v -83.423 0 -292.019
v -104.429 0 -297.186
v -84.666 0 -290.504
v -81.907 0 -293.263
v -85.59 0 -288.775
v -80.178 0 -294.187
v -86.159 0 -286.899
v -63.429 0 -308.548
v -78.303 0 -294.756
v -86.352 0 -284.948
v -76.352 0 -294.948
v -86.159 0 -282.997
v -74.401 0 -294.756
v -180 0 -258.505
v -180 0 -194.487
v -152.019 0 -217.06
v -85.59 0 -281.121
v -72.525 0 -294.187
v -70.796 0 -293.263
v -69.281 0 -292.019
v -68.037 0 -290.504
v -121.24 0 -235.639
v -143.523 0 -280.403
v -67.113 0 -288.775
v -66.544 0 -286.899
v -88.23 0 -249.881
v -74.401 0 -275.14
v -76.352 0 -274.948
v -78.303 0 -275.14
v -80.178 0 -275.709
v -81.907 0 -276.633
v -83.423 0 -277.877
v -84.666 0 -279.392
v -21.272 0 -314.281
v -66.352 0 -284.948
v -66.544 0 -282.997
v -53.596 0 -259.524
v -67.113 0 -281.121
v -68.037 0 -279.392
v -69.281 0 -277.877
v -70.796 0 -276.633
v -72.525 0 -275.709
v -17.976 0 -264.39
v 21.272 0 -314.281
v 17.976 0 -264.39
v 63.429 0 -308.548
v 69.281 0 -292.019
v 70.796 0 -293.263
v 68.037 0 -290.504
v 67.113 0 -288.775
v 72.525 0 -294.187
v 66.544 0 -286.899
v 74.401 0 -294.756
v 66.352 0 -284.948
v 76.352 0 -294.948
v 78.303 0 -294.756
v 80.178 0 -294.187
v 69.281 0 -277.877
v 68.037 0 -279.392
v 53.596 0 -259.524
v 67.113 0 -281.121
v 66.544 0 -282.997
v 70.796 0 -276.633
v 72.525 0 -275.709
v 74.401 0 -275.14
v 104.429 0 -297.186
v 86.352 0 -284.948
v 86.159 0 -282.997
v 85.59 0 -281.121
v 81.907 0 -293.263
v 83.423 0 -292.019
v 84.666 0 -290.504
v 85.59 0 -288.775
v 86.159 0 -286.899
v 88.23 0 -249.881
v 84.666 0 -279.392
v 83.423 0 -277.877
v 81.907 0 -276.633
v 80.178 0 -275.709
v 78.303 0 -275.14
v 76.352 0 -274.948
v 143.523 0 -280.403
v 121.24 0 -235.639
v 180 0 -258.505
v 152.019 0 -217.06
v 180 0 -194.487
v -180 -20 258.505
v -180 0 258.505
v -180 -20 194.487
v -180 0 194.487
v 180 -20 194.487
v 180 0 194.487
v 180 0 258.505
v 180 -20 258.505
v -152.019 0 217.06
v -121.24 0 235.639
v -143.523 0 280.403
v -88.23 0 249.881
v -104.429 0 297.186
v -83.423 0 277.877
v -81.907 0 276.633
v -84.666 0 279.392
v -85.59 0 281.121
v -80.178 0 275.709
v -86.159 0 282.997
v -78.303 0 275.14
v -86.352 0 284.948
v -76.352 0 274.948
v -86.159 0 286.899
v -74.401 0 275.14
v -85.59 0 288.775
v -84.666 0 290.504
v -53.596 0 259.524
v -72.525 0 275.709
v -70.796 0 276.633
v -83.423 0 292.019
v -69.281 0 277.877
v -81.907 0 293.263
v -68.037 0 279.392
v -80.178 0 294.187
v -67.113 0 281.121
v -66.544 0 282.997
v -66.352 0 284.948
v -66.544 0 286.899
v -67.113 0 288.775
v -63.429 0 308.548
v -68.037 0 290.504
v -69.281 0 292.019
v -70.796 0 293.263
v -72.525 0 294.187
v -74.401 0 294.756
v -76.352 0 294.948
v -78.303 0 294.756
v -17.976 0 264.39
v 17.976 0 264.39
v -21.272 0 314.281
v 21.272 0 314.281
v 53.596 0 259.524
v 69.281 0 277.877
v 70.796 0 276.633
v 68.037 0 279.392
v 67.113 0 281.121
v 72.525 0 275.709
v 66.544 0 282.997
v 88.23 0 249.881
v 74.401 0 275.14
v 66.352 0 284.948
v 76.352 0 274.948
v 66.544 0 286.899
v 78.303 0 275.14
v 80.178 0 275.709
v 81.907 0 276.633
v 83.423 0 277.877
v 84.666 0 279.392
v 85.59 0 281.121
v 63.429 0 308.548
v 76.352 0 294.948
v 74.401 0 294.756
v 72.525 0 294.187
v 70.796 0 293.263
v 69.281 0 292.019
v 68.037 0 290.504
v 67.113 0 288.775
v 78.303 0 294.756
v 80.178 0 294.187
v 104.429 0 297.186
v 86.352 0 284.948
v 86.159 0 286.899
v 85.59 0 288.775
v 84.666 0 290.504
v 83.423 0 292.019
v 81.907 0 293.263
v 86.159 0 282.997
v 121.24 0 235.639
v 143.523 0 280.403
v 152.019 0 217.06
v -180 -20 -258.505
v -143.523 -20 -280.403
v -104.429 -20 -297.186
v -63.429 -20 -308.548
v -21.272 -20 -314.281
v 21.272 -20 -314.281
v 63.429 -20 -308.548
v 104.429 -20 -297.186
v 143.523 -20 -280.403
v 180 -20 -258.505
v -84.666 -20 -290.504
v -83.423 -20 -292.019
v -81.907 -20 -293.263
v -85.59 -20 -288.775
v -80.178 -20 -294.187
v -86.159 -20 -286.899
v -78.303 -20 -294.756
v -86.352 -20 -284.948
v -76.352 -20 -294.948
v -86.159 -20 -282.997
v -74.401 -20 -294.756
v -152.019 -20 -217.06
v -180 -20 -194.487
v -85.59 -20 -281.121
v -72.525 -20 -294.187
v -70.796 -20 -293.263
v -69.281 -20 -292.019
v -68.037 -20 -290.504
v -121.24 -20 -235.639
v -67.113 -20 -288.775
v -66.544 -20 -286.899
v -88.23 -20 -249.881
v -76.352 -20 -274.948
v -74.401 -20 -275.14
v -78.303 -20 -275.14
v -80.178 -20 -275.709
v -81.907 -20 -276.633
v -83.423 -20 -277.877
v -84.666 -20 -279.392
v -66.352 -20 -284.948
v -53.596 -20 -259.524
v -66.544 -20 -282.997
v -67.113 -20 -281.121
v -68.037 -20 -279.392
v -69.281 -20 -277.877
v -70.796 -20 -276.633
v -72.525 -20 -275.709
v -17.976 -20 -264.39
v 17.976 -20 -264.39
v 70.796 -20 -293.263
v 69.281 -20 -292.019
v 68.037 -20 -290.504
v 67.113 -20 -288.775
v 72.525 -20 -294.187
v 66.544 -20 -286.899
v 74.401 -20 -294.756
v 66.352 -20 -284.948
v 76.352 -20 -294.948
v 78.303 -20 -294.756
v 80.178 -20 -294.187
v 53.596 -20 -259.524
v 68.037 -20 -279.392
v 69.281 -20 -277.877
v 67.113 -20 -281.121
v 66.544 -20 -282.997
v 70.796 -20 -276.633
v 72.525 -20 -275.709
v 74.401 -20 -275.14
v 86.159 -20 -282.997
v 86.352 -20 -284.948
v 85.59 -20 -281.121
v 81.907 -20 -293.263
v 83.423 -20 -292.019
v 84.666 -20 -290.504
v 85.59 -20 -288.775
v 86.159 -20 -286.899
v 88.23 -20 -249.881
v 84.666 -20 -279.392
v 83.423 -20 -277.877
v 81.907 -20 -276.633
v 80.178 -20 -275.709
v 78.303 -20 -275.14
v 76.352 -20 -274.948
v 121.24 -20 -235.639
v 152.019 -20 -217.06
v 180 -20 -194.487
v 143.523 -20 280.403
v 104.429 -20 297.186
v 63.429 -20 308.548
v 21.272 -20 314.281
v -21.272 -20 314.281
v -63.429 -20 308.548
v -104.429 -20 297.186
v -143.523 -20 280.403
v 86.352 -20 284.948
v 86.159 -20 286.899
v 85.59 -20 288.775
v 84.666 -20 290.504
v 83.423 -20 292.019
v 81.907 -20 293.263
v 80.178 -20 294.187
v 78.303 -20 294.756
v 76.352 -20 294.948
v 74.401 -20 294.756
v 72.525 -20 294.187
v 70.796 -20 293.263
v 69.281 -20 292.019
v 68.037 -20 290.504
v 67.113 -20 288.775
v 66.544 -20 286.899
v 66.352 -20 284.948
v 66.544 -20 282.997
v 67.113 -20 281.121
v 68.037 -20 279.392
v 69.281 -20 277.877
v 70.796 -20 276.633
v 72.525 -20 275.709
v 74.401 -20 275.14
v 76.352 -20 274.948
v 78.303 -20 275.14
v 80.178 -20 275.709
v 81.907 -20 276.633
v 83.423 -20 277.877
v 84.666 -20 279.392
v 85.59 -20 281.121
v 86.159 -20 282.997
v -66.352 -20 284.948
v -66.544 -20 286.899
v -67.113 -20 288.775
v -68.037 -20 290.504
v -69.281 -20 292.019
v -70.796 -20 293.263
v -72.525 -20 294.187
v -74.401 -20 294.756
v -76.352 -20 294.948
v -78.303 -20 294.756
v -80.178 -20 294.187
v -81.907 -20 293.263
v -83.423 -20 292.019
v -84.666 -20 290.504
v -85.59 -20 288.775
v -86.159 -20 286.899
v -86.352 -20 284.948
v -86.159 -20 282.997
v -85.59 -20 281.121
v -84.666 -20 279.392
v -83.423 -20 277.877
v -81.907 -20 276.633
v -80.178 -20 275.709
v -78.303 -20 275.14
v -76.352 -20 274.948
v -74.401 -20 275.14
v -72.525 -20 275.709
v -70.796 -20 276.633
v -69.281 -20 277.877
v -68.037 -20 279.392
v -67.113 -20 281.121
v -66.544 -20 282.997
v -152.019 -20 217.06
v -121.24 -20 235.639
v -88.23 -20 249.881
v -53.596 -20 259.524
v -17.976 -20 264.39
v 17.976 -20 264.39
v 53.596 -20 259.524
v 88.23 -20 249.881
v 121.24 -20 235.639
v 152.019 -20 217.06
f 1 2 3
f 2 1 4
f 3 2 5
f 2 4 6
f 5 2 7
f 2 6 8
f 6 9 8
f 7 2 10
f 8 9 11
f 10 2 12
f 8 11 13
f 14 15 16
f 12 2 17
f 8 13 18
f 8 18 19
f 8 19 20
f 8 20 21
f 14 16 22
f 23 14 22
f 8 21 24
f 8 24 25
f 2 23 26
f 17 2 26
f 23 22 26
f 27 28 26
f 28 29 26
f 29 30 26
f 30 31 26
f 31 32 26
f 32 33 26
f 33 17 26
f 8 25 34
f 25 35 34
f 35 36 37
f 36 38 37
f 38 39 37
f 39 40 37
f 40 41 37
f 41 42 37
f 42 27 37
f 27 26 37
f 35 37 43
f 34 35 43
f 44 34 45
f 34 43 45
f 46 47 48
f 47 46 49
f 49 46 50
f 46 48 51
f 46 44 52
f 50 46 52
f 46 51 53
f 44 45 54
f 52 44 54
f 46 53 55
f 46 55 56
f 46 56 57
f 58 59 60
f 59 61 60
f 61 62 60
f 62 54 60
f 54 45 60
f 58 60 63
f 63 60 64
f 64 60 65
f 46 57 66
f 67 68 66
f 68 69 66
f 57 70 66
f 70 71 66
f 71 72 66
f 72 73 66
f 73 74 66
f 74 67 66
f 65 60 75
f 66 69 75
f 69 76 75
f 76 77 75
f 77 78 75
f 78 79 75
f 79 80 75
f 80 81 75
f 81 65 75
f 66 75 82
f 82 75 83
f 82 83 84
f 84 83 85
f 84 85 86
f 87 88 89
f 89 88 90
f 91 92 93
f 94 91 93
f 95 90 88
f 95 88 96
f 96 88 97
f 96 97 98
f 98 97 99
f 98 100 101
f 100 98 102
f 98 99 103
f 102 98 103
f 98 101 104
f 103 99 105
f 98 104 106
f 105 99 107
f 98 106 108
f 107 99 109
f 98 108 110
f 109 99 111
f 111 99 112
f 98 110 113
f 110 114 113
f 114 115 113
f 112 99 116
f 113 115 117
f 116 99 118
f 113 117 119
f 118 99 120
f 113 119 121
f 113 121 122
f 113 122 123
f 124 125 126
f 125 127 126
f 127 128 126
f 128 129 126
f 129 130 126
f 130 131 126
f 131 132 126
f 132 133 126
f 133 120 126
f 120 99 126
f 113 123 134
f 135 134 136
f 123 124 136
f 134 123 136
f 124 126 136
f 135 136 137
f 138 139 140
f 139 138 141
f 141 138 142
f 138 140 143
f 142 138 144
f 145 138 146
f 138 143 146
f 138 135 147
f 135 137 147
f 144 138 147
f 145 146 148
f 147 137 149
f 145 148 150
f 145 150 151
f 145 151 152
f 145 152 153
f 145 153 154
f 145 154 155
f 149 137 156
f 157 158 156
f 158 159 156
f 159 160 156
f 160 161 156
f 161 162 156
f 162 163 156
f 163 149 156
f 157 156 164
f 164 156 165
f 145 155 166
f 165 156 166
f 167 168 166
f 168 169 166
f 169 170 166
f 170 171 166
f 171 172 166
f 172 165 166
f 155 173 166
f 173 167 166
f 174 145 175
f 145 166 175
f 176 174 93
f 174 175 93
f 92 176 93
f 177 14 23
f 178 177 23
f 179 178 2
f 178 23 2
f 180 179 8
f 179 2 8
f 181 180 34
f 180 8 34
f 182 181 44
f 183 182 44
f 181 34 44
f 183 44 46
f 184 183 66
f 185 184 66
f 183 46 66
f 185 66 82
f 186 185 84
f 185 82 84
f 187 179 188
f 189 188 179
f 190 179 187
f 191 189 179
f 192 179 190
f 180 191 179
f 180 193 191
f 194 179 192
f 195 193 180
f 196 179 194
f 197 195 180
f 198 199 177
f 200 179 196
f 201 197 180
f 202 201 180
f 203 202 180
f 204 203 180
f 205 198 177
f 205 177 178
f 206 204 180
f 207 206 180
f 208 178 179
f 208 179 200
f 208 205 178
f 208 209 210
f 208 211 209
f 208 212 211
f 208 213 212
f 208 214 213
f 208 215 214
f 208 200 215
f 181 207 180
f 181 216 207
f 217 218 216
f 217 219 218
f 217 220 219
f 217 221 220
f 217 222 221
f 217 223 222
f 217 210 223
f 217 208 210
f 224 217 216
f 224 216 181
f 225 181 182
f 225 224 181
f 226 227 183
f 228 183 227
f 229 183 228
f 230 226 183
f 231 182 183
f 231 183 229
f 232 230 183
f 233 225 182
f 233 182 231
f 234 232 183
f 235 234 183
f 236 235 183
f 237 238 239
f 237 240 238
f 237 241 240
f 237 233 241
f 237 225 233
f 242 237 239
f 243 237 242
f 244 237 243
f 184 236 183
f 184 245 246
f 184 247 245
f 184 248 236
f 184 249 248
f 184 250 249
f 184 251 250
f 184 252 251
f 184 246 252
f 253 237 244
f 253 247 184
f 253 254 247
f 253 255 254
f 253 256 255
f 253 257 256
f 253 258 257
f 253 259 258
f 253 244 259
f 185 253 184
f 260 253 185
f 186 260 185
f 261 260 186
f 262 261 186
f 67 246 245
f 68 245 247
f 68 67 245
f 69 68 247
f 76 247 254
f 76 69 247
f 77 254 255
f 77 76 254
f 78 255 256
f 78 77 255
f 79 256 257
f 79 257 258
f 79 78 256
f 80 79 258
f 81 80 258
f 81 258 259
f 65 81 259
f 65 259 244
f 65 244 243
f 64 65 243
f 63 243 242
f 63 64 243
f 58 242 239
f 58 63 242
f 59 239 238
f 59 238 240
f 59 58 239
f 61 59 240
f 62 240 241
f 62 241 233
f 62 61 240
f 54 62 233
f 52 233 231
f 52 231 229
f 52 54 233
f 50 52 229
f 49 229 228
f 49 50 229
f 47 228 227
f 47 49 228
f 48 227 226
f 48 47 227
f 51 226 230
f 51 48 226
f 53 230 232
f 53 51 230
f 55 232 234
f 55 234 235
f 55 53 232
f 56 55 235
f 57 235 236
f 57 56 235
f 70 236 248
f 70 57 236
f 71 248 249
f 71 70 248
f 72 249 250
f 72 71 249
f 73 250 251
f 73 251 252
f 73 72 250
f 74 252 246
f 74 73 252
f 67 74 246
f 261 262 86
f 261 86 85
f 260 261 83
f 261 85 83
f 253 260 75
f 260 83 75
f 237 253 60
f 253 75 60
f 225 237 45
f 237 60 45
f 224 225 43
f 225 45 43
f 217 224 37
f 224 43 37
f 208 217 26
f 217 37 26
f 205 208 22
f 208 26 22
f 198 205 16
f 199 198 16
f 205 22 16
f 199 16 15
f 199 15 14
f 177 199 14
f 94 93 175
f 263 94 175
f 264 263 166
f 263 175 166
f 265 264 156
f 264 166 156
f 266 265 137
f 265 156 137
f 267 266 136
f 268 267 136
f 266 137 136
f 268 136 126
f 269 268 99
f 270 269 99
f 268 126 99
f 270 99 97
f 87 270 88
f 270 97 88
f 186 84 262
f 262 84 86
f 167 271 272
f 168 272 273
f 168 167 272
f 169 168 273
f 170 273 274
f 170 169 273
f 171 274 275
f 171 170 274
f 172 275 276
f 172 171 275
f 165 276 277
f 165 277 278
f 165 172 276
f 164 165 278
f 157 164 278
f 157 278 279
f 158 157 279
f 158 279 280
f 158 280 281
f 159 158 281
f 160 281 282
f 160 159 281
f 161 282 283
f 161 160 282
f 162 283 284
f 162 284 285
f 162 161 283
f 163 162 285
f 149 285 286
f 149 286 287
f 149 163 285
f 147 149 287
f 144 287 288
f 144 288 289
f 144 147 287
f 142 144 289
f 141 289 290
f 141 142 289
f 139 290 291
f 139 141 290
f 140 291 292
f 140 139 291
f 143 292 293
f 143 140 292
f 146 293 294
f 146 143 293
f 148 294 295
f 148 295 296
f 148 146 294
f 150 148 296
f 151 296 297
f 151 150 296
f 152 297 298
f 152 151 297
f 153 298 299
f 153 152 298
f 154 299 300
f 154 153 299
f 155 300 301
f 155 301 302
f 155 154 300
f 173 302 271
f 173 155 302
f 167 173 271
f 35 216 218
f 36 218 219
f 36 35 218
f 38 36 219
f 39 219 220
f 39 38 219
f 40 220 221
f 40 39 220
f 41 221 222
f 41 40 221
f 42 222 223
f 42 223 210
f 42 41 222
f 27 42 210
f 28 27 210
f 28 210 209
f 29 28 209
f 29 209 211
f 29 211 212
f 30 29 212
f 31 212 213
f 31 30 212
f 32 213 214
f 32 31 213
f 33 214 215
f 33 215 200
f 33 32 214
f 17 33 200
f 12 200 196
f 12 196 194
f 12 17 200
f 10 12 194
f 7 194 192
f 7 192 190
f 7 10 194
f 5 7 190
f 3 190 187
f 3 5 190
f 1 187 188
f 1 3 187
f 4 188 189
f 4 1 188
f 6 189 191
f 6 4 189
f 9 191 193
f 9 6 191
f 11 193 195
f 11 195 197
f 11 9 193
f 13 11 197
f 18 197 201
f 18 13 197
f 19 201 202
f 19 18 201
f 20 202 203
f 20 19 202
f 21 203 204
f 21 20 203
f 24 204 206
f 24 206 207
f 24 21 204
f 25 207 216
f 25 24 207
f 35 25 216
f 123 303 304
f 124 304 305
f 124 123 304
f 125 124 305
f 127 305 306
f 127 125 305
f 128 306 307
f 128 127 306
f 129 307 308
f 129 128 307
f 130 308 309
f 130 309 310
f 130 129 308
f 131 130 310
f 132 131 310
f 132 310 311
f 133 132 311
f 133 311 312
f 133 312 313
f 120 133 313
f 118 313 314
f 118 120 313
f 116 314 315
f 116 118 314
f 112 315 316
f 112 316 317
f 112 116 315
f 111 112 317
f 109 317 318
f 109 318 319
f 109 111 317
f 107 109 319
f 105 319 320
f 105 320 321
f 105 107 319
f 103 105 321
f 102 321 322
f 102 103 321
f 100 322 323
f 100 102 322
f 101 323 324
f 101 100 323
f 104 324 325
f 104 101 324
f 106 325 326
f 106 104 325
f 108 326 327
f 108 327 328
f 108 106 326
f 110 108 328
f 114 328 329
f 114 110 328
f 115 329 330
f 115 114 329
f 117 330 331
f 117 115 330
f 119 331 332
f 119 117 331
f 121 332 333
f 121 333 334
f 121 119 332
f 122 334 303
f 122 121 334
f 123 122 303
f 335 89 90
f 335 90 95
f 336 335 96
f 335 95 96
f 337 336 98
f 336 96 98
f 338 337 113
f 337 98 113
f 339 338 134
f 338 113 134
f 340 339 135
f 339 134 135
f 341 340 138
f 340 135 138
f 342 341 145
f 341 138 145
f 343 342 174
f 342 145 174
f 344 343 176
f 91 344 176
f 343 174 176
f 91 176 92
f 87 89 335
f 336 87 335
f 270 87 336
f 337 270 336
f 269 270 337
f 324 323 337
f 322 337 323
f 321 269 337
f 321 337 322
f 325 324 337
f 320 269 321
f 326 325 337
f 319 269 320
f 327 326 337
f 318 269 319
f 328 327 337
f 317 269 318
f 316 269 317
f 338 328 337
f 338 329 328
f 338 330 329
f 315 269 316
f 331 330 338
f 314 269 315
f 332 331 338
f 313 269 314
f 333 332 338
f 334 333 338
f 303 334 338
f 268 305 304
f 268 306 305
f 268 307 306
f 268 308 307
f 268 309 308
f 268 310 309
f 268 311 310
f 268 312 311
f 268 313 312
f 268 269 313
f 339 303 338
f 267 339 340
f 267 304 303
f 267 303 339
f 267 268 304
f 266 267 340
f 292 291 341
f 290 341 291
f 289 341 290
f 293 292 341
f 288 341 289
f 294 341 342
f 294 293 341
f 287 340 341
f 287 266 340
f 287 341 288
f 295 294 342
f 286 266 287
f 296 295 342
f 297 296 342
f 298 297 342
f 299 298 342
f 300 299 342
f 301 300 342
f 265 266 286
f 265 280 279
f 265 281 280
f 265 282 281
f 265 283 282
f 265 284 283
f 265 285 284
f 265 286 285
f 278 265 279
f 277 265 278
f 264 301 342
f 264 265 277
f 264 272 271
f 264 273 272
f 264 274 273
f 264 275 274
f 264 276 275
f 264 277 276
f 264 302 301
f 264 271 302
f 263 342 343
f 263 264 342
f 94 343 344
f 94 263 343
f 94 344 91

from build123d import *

# Parameters (mm, degrees)
F0_R     = 10
F1_DEPTH = 20


with BuildPart() as f1:
    # F0 (on Front) → F1 (new body)
    with BuildSketch(Plane.XZ):
        with BuildLine():
            ThreePointArc((-180, 194.4865033878), (0, 265), (180, 194.4865033878))
            Line((180, 194.4865033878), (180, 258.5053190942))
            ThreePointArc((180, 258.5053190942), (0, 315), (-180, 258.5053190942))
            Line((-180, 258.5053190942), (-180, 194.4865033878))
        make_face()
        with Locations((-76.3516183052, 284.9481187553)):
            Circle(F0_R, mode=Mode.SUBTRACT)
        with Locations((76.3516183052, 284.9481187553)):
            Circle(F0_R, mode=Mode.SUBTRACT)
    extrude(amount=F1_DEPTH)


with BuildPart() as f1b:
    # F0 (on Front) → F1, piece 2 (new body)
    with BuildSketch(Plane.XZ):
        with BuildLine():
            Line((180, -258.5053190942), (180, -194.4865033878))
            ThreePointArc((180, -194.4865033878), (0, -265), (-180, -194.4865033878))
            Line((-180, -194.4865033878), (-180, -258.5053190942))
            ThreePointArc((-180, -258.5053190942), (0, -315), (180, -258.5053190942))
        make_face()
        with Locations((-76.3516183052, -284.9481187553)):
            Circle(F0_R, mode=Mode.SUBTRACT)
        with Locations((76.3516183052, -284.9481187553)):
            Circle(F0_R, mode=Mode.SUBTRACT)
    extrude(amount=F1_DEPTH)


solid = Compound([f1.part, f1b.part])
